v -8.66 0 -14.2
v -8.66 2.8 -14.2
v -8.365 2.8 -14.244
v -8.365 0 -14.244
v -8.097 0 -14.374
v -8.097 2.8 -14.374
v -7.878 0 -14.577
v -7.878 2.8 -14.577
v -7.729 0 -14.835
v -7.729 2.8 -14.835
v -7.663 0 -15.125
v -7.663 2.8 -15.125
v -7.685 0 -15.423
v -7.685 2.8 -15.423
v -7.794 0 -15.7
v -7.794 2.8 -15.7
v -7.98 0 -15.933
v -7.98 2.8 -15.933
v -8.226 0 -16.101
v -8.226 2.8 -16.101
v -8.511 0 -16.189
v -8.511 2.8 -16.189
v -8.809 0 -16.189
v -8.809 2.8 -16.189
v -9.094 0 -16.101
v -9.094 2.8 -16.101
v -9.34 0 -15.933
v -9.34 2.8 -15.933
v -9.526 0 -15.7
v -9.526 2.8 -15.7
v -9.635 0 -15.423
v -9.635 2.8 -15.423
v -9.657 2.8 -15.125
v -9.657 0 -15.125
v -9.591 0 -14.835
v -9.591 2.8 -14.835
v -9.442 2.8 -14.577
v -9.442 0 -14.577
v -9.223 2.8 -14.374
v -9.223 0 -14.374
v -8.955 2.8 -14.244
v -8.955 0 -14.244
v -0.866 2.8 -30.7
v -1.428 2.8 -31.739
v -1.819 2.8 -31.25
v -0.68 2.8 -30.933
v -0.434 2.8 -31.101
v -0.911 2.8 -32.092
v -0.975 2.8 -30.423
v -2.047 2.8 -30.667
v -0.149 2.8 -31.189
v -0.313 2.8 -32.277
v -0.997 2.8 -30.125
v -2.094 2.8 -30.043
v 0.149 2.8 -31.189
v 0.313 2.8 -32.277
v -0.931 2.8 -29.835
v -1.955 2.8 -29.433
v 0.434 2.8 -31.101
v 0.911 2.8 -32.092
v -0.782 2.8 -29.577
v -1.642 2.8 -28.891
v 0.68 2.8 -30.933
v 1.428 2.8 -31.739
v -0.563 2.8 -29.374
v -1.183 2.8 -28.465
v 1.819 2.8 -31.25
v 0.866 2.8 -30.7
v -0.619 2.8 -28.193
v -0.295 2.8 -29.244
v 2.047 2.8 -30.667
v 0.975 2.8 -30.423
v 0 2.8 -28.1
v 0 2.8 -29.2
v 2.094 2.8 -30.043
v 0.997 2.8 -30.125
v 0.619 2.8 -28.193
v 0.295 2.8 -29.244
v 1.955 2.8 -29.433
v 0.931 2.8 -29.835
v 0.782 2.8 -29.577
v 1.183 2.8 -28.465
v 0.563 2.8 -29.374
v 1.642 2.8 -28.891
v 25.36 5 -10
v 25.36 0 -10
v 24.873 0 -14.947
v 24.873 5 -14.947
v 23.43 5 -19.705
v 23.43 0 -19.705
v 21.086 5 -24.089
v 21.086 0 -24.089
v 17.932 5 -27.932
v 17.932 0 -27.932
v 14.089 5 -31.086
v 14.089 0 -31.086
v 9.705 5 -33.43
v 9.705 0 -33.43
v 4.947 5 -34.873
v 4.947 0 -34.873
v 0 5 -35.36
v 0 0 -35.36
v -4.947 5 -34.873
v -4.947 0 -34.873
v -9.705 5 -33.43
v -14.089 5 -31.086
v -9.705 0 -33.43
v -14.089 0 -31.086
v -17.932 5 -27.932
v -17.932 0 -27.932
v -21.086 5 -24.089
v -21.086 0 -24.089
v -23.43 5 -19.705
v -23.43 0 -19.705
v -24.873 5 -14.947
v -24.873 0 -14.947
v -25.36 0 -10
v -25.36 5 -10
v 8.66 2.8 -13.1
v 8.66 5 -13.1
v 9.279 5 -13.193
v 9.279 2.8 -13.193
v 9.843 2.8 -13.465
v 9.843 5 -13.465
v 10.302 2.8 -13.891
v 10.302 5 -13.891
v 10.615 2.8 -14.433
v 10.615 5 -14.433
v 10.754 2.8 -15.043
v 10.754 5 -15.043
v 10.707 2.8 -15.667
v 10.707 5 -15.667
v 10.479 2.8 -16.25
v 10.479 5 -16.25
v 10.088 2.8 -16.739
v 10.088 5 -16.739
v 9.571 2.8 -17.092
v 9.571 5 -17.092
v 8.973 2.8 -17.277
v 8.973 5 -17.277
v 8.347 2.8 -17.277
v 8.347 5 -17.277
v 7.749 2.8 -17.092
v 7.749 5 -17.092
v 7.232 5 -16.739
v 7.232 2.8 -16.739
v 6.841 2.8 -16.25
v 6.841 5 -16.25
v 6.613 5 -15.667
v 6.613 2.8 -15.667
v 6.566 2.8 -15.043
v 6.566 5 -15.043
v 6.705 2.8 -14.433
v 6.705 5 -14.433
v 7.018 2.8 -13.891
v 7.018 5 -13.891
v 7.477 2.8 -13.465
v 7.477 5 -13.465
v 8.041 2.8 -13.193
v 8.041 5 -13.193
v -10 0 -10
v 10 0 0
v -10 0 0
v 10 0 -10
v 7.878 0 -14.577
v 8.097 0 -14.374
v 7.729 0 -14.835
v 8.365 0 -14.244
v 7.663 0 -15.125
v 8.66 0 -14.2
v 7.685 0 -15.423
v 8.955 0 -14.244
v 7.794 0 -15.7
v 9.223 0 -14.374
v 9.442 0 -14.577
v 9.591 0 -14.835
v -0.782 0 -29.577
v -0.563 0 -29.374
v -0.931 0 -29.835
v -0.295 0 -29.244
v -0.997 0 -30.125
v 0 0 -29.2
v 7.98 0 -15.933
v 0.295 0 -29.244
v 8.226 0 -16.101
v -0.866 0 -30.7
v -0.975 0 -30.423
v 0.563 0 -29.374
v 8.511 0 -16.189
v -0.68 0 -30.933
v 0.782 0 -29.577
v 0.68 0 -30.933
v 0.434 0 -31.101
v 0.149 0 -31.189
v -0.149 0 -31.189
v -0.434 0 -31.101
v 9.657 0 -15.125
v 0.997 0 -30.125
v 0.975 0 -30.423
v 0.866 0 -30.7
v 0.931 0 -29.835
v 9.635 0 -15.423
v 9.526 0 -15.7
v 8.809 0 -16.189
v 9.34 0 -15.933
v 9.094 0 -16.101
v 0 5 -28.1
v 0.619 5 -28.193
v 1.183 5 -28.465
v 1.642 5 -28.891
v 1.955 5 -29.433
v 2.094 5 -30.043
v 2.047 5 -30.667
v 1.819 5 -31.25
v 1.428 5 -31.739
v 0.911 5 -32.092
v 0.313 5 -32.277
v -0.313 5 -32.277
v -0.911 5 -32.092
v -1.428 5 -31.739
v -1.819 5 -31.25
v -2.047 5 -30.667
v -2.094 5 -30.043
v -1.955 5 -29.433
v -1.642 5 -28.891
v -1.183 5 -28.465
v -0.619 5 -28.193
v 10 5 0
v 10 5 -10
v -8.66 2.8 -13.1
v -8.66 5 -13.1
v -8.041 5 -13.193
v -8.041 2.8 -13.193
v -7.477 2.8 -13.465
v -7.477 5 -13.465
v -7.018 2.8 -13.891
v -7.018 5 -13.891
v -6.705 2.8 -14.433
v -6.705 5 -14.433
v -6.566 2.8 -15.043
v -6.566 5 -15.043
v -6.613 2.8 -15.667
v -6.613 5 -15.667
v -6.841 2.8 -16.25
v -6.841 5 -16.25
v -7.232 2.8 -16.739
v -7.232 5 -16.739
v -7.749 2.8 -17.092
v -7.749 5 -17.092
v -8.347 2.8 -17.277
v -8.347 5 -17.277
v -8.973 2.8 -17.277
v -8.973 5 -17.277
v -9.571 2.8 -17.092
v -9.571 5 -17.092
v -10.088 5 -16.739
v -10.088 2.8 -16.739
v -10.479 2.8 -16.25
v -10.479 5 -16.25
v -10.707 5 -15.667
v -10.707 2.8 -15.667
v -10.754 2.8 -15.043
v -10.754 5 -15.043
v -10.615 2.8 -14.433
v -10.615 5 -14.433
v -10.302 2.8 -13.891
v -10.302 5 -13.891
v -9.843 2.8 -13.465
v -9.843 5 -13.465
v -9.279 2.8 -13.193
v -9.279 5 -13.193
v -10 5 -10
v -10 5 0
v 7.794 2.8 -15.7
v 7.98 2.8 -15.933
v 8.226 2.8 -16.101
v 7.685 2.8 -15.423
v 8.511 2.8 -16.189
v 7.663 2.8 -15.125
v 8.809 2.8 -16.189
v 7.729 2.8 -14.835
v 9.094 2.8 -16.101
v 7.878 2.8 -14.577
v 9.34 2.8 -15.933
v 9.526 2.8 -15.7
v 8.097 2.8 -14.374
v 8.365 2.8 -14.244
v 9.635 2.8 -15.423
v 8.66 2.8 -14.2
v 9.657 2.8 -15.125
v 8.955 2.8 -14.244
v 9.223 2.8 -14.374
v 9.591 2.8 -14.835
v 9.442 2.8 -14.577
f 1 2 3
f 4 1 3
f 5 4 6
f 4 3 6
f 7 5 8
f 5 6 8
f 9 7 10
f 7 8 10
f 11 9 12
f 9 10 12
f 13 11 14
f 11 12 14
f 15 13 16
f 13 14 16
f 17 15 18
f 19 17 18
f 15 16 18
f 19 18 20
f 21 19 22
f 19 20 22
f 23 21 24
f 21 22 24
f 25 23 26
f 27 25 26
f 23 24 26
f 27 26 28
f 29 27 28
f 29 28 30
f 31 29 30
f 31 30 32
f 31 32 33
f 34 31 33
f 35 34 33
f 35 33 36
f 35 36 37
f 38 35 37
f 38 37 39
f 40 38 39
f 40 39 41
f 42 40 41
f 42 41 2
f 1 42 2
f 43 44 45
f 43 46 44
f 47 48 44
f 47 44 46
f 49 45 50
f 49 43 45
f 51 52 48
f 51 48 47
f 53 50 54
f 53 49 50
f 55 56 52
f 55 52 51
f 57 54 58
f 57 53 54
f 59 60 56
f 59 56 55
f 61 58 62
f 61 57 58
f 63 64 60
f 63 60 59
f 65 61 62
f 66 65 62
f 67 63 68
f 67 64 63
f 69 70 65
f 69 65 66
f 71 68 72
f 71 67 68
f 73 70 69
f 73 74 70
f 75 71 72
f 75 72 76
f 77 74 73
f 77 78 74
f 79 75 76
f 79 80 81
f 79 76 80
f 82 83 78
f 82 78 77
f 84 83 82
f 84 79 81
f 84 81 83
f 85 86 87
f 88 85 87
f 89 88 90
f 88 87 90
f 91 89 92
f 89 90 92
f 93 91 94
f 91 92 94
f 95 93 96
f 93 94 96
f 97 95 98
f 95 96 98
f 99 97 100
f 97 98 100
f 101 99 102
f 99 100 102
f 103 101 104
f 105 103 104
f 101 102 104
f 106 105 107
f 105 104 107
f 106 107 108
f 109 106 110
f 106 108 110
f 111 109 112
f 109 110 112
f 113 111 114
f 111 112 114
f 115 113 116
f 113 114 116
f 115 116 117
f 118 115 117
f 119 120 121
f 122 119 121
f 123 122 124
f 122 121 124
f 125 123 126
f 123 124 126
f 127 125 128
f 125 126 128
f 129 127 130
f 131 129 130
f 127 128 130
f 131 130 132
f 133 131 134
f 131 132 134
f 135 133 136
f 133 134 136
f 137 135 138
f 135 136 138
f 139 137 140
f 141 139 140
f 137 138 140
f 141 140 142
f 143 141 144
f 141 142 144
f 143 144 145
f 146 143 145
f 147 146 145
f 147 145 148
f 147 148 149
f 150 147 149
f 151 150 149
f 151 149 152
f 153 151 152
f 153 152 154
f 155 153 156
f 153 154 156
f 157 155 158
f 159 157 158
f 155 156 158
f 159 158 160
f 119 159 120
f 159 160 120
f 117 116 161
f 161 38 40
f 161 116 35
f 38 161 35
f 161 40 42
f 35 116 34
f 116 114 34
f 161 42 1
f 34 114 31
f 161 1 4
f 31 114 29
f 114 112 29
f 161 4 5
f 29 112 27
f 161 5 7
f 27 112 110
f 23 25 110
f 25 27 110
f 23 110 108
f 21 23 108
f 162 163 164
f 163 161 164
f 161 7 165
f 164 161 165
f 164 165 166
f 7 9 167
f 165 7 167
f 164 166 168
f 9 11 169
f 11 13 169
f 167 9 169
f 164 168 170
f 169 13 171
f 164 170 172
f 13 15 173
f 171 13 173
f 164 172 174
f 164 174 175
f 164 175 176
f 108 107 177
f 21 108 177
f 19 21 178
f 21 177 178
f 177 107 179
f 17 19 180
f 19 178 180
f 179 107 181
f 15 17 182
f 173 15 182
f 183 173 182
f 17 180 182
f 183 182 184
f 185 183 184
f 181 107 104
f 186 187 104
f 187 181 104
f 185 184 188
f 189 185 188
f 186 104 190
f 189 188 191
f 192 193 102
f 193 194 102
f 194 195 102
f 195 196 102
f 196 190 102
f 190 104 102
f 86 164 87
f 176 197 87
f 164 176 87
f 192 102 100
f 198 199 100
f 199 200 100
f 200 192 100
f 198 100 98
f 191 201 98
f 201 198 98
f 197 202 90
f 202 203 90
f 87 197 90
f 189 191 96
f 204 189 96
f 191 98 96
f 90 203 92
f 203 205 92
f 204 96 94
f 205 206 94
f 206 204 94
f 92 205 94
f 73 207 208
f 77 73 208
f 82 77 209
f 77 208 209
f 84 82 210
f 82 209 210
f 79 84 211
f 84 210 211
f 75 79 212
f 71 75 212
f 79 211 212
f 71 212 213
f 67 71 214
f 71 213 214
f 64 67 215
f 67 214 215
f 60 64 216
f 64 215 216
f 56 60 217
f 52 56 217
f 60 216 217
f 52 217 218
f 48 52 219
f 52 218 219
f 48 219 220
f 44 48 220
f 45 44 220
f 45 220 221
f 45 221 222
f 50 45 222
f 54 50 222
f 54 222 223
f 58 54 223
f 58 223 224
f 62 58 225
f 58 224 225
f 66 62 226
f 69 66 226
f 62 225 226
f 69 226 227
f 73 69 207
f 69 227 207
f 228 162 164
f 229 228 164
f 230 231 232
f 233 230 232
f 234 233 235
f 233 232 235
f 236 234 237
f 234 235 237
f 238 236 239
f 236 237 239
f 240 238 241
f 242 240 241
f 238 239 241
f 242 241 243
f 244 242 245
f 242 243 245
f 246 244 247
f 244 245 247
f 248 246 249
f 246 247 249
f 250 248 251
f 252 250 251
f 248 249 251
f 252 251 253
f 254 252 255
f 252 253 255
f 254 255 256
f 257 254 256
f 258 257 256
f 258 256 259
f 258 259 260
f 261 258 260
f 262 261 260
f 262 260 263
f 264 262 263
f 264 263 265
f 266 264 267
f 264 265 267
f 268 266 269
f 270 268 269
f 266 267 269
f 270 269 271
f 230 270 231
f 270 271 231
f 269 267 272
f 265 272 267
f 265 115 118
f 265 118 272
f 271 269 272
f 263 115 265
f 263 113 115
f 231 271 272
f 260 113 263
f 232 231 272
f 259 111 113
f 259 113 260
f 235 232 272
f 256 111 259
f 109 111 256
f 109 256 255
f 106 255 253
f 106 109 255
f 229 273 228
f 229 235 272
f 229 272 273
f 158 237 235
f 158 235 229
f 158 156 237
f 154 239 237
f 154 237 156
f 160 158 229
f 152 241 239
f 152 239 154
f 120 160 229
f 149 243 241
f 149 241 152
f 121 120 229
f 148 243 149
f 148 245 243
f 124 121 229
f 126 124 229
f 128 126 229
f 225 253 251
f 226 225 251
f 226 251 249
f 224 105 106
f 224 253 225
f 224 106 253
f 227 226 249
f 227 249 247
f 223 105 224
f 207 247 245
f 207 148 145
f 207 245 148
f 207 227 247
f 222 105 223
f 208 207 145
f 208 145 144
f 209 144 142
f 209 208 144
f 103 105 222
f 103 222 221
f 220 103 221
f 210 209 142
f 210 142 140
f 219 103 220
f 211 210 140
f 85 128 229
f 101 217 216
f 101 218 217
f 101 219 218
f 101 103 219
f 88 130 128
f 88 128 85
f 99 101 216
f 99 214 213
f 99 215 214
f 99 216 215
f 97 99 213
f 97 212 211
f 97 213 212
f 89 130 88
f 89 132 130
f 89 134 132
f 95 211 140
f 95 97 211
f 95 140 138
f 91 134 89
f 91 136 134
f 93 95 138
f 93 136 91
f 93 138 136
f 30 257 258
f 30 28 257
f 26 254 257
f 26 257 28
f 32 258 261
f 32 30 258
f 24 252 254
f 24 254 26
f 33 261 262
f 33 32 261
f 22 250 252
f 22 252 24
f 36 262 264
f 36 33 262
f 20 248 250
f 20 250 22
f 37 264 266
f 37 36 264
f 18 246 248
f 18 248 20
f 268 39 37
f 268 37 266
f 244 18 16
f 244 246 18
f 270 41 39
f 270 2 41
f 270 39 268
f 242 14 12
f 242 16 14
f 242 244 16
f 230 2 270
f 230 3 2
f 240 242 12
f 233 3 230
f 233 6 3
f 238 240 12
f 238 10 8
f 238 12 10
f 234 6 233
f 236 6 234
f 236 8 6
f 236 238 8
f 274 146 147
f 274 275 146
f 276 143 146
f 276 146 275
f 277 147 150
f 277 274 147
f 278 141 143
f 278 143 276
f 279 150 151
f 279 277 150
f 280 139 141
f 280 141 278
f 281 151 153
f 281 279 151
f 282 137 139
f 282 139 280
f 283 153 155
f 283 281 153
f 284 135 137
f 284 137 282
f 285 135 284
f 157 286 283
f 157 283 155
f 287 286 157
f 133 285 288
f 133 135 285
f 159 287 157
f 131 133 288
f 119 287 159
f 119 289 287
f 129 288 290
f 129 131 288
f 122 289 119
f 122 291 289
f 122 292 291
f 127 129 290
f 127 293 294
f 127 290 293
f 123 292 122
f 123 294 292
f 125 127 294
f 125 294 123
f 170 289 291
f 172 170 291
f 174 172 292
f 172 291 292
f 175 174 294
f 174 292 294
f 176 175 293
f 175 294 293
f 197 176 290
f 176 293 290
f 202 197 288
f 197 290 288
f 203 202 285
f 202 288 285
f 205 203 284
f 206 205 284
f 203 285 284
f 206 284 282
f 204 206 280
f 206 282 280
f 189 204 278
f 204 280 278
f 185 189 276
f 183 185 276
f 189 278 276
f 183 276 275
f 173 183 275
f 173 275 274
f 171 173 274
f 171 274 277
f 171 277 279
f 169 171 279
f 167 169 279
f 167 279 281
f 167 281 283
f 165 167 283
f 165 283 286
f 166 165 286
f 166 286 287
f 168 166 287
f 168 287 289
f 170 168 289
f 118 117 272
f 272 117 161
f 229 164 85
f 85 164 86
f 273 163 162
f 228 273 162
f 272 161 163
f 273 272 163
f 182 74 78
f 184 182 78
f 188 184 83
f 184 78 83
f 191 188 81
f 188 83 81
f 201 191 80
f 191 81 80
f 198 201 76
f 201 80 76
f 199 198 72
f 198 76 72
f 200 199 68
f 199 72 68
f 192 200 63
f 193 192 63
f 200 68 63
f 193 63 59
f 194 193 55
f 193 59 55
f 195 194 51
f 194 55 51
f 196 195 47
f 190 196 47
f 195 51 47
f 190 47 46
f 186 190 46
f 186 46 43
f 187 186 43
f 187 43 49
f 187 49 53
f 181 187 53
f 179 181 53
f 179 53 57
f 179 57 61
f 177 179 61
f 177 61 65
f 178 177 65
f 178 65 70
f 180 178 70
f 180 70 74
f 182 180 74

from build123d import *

# Parameters (mm, degrees)
SALIENTE_EXTRUIR1_DEPTH = 5
CROQUIS2_R              = 2.1
CORTAR_EXTRUIR1_DEPTH   = 2.2
CROQUIS3_R              = 1
CORTAR_EXTRUIR2_DEPTH   = 10


with BuildPart() as part:
    # Croquis1 → Saliente-Extruir1 (new body)
    with BuildSketch(Plane(origin=(0, 0, 0), x_dir=(1, 0, 0), z_dir=(0, 1, 0))):
        with BuildLine():
            Line((-10, 0), (10, 0))
            Line((10, 0), (10, 10))
            Line((10, 10), (25.36, 10))
            ThreePointArc((25.36, 10), (0, 35.36), (-25.36, 10))
            Line((-25.36, 10), (-10, 10))
            Line((-10, 10), (-10, 0))
        make_face()
    extrude(amount=SALIENTE_EXTRUIR1_DEPTH)

    # Croquis2 → Cortar-Extruir1 (cut)
    with BuildSketch(Plane(origin=(0, 5, 0), x_dir=(1, 0, 0), z_dir=(0, 1, 0))):
        with Locations(Location((0, 30.2, 0), (0, 0, 270))):
            Circle(CROQUIS2_R)
        with Locations(Location((8.66, 15.2, 0), (0, 0, 270))):
            Circle(CROQUIS2_R)
        with Locations(Location((-8.66, 15.2, 0), (0, 0, 270))):
            Circle(CROQUIS2_R)
    extrude(amount=-CORTAR_EXTRUIR1_DEPTH, mode=Mode.SUBTRACT)

    # Croquis3 → Cortar-Extruir2 (cut)
    with BuildSketch(Plane(origin=(0, 5, 0), x_dir=(1, 0, 0), z_dir=(0, 1, 0))):
        with Locations(Location((-8.66, 15.2, 0), (0, 0, 270))):
            Circle(CROQUIS3_R)
        with Locations(Location((8.66, 15.2, 0), (0, 0, 270))):
            Circle(CROQUIS3_R)
        with Locations(Location((0, 30.2, 0), (0, 0, 270))):
            Circle(CROQUIS3_R)
    extrude(amount=-CORTAR_EXTRUIR2_DEPTH, mode=Mode.SUBTRACT)


solid = part.part
